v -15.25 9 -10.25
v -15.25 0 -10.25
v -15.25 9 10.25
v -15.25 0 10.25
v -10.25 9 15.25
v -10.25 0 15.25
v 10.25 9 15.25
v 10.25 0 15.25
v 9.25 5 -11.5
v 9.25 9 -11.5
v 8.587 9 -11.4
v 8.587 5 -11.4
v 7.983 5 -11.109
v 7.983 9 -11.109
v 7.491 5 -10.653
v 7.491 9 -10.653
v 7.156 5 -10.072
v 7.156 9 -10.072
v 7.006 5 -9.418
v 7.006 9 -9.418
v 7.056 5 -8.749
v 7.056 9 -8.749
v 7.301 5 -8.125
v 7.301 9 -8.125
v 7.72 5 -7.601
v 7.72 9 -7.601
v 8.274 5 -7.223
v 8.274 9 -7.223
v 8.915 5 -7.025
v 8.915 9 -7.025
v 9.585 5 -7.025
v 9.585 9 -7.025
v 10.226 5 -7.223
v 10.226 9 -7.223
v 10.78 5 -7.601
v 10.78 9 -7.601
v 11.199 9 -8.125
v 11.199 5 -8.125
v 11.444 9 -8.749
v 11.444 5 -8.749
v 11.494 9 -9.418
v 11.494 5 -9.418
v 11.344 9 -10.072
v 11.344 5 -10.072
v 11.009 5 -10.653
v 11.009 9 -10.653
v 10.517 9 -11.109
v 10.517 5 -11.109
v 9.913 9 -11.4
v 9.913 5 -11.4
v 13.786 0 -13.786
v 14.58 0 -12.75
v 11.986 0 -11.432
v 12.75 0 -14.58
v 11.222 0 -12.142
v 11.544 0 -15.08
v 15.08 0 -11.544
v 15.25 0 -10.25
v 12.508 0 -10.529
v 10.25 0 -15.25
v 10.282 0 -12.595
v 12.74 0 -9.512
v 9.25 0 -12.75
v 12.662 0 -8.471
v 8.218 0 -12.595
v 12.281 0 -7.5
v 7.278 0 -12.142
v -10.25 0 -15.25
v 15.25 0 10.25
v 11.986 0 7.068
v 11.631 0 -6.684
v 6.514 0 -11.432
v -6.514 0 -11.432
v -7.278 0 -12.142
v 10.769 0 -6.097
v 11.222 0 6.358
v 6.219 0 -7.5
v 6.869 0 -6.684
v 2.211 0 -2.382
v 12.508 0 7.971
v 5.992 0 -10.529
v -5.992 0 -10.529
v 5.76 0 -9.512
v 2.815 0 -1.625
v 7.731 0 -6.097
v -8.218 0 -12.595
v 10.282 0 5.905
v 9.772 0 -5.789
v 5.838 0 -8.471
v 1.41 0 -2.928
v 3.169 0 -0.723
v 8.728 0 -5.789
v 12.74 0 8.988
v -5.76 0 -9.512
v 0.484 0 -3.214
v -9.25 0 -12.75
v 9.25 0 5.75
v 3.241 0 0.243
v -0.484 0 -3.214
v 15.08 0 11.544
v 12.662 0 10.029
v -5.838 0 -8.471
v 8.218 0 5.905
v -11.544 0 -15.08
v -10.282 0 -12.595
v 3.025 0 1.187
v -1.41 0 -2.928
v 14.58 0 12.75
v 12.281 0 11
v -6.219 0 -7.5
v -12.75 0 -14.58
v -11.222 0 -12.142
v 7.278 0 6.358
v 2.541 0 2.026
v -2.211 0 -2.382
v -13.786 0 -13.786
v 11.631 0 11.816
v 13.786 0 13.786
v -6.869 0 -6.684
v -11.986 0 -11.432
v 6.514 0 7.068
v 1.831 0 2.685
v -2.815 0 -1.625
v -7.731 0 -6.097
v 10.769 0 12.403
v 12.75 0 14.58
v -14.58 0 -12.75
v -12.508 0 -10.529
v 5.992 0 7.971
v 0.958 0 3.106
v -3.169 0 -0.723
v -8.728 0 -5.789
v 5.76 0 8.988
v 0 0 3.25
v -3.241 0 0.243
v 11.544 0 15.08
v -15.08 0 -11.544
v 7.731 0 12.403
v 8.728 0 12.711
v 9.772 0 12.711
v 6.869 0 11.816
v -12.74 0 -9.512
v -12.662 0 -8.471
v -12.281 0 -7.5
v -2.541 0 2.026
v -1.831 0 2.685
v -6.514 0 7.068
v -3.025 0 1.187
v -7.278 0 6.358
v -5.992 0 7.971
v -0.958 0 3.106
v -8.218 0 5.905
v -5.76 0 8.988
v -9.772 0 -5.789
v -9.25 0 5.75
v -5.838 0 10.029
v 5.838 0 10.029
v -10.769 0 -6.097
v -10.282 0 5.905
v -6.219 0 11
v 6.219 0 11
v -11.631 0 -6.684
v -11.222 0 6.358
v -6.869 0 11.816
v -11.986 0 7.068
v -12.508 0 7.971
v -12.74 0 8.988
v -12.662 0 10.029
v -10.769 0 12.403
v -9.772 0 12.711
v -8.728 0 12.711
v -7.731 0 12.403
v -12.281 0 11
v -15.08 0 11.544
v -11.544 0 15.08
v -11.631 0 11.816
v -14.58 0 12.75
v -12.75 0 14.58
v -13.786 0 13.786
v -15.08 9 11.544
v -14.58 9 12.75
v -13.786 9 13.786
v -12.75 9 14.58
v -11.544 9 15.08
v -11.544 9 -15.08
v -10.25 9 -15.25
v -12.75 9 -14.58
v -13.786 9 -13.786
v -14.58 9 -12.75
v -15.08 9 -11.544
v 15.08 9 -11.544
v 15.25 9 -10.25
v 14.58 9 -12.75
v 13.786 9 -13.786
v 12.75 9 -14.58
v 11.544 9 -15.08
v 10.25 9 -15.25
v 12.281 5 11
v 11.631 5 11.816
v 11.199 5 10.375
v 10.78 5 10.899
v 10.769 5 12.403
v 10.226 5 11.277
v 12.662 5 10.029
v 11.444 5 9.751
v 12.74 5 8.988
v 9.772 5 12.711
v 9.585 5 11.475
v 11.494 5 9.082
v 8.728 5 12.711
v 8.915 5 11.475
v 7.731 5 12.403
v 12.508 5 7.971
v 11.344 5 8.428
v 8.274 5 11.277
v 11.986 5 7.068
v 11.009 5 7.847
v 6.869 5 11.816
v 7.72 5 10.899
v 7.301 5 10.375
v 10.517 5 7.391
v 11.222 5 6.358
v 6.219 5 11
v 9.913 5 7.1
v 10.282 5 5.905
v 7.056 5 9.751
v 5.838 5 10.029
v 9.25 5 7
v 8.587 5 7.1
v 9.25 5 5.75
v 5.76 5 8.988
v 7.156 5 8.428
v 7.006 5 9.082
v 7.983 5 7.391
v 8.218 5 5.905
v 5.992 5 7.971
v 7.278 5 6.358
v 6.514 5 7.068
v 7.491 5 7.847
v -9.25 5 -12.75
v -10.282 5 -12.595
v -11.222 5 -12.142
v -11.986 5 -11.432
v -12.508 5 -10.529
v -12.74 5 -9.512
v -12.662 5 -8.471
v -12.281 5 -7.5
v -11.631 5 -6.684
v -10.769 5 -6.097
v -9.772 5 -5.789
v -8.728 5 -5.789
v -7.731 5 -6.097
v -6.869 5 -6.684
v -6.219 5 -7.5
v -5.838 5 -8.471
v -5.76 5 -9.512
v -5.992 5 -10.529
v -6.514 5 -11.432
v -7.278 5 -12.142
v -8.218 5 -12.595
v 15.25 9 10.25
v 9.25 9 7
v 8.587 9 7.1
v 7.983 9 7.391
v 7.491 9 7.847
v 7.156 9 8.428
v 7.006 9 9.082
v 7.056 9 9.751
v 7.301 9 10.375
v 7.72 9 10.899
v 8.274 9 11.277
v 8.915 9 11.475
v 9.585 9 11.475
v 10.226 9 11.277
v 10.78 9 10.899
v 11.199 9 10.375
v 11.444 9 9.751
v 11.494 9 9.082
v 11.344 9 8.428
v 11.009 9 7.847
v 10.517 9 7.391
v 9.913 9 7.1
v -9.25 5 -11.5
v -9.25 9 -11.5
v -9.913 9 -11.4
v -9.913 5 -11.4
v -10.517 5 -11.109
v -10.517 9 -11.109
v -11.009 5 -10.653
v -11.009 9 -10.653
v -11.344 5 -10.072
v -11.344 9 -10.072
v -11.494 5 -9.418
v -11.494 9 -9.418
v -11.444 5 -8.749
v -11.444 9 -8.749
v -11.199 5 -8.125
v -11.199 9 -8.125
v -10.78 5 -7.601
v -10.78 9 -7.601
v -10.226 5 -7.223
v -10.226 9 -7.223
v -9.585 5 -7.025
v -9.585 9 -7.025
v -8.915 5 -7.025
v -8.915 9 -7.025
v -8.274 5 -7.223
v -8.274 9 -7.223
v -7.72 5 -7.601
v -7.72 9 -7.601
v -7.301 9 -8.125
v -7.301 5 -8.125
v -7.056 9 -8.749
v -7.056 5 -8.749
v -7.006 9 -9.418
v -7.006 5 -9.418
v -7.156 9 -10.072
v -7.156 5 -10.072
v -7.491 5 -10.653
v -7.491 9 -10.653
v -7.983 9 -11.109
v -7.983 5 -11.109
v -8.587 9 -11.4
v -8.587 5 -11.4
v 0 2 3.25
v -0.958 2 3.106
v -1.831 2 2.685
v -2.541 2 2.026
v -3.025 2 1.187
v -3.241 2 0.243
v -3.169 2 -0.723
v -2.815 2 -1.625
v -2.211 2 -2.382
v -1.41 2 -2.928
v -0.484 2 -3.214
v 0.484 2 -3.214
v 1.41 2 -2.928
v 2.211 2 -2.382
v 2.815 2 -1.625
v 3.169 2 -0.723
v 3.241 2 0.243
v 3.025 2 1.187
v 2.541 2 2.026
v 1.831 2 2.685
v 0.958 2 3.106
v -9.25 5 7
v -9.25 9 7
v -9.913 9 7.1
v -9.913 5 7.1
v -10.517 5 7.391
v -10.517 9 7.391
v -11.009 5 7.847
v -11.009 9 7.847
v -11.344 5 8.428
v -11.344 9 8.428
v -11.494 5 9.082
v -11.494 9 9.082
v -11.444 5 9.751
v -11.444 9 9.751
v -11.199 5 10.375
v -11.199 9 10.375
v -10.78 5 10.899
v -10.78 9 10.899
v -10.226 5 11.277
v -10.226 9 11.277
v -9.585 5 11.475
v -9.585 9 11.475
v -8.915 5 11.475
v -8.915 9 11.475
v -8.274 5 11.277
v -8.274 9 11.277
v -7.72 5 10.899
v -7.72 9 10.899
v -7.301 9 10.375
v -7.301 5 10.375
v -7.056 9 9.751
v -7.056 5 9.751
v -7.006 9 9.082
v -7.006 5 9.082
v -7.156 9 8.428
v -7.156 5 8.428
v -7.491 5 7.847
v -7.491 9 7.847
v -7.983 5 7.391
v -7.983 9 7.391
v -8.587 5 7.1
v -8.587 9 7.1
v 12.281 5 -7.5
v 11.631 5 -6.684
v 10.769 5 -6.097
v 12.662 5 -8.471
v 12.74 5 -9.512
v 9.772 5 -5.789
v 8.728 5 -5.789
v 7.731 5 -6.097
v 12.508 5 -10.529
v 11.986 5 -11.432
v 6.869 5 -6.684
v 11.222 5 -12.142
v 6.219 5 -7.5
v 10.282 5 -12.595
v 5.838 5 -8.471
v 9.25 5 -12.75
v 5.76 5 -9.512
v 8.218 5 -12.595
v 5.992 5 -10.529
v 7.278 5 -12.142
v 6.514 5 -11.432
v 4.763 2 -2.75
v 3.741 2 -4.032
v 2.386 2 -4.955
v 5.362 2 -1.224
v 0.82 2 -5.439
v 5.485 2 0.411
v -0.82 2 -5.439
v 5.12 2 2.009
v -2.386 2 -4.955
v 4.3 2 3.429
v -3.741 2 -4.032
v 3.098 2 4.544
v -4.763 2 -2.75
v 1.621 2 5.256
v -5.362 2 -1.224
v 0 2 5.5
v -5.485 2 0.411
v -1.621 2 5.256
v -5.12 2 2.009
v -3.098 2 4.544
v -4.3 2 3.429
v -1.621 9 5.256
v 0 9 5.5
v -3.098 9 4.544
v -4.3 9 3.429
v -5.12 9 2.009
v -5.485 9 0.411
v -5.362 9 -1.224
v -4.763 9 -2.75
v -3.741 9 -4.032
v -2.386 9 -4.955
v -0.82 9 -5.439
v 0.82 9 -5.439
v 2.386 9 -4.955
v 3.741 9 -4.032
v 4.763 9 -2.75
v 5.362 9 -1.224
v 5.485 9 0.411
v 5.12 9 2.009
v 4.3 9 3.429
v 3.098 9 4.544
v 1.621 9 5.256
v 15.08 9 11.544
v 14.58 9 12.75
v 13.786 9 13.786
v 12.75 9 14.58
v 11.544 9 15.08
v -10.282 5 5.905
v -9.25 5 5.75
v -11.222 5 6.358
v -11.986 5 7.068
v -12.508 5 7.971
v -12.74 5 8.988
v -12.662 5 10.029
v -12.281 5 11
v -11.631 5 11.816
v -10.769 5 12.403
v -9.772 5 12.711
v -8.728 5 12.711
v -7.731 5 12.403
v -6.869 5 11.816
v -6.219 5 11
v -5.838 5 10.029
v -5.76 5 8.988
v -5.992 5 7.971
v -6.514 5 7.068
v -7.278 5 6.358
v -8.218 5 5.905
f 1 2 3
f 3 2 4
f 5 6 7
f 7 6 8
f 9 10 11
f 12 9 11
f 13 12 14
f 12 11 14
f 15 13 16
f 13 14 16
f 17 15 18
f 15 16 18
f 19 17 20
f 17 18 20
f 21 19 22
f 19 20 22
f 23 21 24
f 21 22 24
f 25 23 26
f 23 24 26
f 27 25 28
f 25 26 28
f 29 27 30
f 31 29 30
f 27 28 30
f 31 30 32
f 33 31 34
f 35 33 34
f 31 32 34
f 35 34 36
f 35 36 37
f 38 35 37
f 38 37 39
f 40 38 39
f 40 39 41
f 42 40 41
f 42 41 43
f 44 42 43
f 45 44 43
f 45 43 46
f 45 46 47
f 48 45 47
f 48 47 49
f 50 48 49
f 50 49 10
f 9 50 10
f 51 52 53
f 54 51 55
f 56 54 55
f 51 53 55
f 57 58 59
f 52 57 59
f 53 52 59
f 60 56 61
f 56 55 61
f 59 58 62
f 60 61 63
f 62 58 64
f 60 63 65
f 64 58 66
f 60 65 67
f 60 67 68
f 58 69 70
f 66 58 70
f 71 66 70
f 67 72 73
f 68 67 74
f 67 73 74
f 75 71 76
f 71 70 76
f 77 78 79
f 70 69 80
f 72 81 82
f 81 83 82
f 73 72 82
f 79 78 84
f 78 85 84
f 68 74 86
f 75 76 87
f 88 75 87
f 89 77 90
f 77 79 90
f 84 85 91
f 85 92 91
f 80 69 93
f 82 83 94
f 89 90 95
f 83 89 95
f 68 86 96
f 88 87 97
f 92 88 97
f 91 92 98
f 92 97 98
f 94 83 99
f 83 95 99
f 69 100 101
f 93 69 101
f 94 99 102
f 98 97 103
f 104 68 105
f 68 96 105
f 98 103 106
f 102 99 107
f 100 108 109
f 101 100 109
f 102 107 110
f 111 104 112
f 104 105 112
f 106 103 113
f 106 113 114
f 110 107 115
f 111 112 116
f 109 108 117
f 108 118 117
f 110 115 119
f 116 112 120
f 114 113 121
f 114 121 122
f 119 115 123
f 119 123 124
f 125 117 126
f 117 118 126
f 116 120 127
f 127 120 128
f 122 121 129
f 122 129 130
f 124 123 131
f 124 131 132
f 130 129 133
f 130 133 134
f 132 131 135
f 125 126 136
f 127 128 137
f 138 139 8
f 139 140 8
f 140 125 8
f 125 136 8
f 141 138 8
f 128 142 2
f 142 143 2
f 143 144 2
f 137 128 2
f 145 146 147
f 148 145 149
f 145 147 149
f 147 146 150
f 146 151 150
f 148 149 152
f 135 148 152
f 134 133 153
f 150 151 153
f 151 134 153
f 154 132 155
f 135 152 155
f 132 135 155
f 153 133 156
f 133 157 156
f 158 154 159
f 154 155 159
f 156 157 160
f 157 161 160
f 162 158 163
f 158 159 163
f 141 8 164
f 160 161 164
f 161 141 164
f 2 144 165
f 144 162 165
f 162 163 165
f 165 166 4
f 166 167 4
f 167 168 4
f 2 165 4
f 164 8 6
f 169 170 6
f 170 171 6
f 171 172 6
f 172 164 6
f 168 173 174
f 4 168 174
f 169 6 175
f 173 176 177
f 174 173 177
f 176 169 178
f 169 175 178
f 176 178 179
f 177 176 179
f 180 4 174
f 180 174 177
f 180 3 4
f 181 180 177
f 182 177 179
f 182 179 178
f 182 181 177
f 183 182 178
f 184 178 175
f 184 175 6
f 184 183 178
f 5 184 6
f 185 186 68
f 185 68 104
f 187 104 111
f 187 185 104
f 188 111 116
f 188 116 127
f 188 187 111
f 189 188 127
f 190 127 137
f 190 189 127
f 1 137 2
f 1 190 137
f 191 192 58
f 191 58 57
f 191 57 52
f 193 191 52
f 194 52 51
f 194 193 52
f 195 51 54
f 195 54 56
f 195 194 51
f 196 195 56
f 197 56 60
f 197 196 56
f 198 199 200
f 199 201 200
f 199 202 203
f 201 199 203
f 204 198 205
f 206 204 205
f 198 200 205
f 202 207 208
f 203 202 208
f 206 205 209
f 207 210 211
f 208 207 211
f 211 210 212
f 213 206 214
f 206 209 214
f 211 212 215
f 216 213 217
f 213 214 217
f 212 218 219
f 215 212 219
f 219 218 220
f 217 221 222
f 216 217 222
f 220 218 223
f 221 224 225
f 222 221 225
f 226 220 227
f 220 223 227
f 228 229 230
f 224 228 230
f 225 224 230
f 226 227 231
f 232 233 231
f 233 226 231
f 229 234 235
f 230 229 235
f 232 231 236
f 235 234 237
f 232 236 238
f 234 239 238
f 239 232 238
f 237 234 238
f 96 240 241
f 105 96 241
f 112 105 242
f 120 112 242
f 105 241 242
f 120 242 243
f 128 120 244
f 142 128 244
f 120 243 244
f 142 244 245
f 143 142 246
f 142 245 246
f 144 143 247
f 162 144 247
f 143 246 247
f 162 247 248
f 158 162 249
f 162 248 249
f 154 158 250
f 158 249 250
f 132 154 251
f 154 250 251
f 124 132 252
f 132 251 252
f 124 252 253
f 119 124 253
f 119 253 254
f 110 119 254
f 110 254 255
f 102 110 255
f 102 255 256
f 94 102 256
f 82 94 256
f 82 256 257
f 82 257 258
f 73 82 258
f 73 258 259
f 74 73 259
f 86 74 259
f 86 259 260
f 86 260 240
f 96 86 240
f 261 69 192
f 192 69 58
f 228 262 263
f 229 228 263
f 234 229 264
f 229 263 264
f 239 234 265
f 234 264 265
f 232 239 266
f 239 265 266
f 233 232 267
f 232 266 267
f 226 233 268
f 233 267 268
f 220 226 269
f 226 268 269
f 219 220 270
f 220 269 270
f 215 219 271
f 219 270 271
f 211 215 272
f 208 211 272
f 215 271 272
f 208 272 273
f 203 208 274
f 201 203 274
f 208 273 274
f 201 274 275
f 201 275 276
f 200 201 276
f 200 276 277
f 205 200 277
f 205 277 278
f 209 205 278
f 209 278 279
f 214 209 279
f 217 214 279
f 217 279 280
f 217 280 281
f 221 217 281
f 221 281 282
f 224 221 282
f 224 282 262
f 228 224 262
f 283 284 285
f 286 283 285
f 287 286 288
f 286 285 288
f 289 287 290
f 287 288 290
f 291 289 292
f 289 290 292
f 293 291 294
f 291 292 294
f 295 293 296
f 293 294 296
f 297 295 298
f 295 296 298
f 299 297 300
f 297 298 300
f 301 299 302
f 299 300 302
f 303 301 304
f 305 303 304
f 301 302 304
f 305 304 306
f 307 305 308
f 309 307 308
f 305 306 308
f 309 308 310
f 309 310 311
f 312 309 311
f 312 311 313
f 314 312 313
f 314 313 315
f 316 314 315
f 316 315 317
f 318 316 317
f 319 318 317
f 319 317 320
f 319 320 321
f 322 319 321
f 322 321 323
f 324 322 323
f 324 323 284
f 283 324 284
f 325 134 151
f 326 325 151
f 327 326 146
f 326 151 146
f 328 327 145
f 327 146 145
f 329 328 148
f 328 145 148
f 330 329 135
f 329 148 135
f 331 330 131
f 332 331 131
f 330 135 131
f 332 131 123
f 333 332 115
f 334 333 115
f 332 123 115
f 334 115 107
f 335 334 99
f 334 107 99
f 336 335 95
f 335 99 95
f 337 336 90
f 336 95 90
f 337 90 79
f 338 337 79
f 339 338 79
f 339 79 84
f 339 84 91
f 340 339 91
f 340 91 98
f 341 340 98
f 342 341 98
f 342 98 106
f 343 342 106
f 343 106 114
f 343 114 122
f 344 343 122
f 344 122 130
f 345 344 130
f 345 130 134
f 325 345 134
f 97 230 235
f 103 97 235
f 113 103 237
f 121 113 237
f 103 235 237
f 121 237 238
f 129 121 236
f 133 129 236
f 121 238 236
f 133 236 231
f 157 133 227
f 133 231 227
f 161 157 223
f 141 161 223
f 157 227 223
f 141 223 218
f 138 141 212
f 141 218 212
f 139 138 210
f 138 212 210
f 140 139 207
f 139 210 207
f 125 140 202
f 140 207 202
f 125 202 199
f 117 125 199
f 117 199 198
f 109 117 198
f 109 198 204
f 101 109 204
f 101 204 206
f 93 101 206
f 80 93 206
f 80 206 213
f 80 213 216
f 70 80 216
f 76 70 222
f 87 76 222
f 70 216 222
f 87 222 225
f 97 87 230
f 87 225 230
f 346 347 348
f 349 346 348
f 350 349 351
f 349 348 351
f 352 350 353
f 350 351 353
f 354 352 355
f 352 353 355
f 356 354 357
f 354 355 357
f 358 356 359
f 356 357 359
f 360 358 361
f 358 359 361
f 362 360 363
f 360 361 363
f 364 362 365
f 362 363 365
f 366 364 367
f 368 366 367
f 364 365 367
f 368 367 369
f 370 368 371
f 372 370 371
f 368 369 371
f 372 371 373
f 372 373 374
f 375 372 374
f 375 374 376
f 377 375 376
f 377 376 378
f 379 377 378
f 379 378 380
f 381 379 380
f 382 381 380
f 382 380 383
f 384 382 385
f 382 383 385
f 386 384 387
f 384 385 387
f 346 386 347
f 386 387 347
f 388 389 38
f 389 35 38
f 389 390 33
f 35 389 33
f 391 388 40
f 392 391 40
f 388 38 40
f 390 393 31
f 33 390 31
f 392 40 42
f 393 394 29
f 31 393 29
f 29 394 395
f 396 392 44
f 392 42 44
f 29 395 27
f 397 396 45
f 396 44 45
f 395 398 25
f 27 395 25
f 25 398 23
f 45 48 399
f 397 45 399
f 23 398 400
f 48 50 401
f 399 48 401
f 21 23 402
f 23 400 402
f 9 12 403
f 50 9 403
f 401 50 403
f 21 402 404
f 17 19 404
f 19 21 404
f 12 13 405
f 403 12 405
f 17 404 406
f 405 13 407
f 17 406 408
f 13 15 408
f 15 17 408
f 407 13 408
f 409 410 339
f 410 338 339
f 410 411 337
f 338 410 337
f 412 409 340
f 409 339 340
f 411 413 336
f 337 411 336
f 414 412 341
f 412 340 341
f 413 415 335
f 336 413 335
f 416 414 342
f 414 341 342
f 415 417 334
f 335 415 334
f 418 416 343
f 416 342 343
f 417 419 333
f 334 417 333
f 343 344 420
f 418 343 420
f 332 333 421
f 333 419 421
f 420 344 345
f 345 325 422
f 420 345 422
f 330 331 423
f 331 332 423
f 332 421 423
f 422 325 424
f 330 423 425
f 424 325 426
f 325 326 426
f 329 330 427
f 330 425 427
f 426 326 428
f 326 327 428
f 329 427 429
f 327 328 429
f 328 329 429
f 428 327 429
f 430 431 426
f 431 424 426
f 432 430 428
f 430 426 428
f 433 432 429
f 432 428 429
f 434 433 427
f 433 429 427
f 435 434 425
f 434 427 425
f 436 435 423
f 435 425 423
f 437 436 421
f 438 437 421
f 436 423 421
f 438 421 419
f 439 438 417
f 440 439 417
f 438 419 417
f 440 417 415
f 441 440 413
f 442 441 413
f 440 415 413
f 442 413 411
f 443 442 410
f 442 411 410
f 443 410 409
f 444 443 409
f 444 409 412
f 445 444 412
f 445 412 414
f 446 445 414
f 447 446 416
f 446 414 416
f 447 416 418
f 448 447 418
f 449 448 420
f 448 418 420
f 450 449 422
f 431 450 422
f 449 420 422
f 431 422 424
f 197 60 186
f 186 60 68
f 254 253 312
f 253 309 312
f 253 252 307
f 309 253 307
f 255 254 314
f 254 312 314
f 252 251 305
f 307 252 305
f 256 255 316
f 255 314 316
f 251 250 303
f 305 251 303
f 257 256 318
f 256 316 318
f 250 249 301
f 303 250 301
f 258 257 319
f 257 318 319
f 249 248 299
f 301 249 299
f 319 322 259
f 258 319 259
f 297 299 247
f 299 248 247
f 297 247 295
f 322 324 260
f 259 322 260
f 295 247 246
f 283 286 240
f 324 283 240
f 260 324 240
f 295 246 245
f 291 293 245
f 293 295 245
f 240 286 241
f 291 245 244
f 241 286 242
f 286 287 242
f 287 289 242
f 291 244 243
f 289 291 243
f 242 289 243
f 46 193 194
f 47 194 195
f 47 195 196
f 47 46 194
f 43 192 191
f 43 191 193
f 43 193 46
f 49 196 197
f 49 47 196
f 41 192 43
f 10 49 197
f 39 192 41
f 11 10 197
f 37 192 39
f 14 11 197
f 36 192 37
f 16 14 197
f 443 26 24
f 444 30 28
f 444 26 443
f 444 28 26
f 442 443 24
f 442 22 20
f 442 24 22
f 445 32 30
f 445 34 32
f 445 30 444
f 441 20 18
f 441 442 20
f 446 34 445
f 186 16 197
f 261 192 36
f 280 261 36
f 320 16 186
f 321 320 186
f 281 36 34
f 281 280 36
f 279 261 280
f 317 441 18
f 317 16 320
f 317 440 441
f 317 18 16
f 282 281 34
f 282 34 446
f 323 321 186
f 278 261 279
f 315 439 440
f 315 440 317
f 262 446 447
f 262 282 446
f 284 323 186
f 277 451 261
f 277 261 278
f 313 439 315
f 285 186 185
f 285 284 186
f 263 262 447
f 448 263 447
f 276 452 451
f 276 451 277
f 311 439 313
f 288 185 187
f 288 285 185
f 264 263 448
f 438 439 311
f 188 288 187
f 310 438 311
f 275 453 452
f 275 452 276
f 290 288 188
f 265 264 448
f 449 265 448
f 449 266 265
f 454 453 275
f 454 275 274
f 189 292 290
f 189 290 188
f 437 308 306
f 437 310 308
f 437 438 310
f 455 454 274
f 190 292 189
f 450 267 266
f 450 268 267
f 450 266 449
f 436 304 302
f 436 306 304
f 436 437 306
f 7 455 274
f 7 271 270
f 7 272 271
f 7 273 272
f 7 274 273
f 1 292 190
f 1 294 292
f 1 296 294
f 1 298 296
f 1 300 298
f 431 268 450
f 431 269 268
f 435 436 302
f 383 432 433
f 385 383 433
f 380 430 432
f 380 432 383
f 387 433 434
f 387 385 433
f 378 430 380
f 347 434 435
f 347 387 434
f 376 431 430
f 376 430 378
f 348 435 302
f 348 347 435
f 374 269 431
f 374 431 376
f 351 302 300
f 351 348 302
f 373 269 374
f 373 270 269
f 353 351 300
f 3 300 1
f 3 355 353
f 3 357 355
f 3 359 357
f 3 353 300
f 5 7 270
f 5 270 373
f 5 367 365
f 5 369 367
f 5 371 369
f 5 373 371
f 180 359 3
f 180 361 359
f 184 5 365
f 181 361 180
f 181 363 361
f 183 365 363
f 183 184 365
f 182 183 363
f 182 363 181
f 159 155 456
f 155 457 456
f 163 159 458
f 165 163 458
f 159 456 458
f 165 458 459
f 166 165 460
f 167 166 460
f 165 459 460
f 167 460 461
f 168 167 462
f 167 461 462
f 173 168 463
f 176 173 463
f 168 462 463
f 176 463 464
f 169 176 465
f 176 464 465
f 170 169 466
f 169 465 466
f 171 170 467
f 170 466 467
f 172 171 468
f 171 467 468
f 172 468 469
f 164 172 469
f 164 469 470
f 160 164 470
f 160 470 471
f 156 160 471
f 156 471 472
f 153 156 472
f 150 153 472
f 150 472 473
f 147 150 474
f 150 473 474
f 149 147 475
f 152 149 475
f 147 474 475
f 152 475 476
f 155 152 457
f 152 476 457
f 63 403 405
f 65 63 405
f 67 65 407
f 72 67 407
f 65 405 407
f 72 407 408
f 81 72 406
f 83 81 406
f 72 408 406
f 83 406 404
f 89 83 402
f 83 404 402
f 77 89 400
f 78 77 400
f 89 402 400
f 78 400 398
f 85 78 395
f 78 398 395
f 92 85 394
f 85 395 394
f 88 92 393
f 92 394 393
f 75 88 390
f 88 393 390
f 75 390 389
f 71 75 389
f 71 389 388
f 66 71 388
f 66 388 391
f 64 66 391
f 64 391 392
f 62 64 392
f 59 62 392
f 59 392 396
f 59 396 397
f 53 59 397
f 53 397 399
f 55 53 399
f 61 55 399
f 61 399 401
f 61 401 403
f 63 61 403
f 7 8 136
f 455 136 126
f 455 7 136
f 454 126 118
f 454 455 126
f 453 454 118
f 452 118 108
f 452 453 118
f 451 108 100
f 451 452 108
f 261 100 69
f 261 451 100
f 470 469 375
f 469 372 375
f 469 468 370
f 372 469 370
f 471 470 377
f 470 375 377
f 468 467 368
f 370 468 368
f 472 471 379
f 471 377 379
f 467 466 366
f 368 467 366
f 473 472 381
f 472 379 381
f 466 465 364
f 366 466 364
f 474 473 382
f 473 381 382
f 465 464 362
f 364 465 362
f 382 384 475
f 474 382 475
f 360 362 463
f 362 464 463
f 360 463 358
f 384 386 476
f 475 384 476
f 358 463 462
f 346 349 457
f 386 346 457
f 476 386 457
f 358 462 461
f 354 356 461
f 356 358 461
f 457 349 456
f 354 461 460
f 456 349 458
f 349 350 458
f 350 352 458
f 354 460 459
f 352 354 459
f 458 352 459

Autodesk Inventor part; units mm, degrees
ref_plane "YZ Plane" through (0, 0, 0) normal (1, 0, 0) x (0, 1, 0)
ref_plane "XZ Plane" through (0, 0, 0) normal (0, 1, 0) x (-1, 0, 0)
ref_plane "XY Plane" through (0, 0, 0) normal (0, 0, 1) x (1, 0, 0)
sketch "Sketch1" plane through (0, 0, 0) normal (0, 1, 0) x (-1, 0, 0)
  line L0 (-15.25, -15.25) -> (15.25, -15.25)
  line L1 (15.25, -15.25) -> (15.25, 15.25)
  line L2 (15.25, 15.25) -> (-15.25, 15.25)
  line L3 (-15.25, 15.25) -> (-15.25, -15.25)
  line L4 (-15.25, -15.25) -> (15.25, 15.25) construction
  line L5 (15.25, -15.25) -> (-15.25, 15.25) construction
  point P0 (0, 0)
  dimension "d0" = 30.5
  dimension "d1" = 30.5
extrude "Extrusion1" add sketch "Sketch1" along normal blind 9
hole "Hole5" at (0, 9, 0) direction (0, -1, 0) diameter 6.5 end through all counterbore diameter 11 counterbore depth 7
fillet "Fillet1" radius 5 1 edges at (15.25, 4.5, 15.25)
fillet "Fillet2" radius 5 1 edges at (15.25, 4.5, -15.25)
fillet "Fillet3" radius 5 1 edges at (-15.25, 4.5, -15.25)
fillet "Fillet4" radius 5 1 edges at (-15.25, 4.5, 15.25)
hole "Hole10" at (-9.25, 0, -9.25) direction (0, 1, 0) diameter 4.5 end through all counterbore diameter 7 counterbore depth 5
hole "Hole11" at (-9.25, 0, 9.25) direction (0, 1, 0) diameter 4.5 end through all counterbore diameter 7 counterbore depth 5
hole "Hole12" at (9.25, 0, 9.25) direction (0, 1, 0) diameter 4.5 end through all counterbore diameter 7 counterbore depth 5
hole "Hole13" at (9.25, 0, -9.25) direction (0, 1, 0) diameter 4.5 end through all counterbore diameter 7 counterbore depth 5
properties part number "OdourPort_minimal_backplate"
